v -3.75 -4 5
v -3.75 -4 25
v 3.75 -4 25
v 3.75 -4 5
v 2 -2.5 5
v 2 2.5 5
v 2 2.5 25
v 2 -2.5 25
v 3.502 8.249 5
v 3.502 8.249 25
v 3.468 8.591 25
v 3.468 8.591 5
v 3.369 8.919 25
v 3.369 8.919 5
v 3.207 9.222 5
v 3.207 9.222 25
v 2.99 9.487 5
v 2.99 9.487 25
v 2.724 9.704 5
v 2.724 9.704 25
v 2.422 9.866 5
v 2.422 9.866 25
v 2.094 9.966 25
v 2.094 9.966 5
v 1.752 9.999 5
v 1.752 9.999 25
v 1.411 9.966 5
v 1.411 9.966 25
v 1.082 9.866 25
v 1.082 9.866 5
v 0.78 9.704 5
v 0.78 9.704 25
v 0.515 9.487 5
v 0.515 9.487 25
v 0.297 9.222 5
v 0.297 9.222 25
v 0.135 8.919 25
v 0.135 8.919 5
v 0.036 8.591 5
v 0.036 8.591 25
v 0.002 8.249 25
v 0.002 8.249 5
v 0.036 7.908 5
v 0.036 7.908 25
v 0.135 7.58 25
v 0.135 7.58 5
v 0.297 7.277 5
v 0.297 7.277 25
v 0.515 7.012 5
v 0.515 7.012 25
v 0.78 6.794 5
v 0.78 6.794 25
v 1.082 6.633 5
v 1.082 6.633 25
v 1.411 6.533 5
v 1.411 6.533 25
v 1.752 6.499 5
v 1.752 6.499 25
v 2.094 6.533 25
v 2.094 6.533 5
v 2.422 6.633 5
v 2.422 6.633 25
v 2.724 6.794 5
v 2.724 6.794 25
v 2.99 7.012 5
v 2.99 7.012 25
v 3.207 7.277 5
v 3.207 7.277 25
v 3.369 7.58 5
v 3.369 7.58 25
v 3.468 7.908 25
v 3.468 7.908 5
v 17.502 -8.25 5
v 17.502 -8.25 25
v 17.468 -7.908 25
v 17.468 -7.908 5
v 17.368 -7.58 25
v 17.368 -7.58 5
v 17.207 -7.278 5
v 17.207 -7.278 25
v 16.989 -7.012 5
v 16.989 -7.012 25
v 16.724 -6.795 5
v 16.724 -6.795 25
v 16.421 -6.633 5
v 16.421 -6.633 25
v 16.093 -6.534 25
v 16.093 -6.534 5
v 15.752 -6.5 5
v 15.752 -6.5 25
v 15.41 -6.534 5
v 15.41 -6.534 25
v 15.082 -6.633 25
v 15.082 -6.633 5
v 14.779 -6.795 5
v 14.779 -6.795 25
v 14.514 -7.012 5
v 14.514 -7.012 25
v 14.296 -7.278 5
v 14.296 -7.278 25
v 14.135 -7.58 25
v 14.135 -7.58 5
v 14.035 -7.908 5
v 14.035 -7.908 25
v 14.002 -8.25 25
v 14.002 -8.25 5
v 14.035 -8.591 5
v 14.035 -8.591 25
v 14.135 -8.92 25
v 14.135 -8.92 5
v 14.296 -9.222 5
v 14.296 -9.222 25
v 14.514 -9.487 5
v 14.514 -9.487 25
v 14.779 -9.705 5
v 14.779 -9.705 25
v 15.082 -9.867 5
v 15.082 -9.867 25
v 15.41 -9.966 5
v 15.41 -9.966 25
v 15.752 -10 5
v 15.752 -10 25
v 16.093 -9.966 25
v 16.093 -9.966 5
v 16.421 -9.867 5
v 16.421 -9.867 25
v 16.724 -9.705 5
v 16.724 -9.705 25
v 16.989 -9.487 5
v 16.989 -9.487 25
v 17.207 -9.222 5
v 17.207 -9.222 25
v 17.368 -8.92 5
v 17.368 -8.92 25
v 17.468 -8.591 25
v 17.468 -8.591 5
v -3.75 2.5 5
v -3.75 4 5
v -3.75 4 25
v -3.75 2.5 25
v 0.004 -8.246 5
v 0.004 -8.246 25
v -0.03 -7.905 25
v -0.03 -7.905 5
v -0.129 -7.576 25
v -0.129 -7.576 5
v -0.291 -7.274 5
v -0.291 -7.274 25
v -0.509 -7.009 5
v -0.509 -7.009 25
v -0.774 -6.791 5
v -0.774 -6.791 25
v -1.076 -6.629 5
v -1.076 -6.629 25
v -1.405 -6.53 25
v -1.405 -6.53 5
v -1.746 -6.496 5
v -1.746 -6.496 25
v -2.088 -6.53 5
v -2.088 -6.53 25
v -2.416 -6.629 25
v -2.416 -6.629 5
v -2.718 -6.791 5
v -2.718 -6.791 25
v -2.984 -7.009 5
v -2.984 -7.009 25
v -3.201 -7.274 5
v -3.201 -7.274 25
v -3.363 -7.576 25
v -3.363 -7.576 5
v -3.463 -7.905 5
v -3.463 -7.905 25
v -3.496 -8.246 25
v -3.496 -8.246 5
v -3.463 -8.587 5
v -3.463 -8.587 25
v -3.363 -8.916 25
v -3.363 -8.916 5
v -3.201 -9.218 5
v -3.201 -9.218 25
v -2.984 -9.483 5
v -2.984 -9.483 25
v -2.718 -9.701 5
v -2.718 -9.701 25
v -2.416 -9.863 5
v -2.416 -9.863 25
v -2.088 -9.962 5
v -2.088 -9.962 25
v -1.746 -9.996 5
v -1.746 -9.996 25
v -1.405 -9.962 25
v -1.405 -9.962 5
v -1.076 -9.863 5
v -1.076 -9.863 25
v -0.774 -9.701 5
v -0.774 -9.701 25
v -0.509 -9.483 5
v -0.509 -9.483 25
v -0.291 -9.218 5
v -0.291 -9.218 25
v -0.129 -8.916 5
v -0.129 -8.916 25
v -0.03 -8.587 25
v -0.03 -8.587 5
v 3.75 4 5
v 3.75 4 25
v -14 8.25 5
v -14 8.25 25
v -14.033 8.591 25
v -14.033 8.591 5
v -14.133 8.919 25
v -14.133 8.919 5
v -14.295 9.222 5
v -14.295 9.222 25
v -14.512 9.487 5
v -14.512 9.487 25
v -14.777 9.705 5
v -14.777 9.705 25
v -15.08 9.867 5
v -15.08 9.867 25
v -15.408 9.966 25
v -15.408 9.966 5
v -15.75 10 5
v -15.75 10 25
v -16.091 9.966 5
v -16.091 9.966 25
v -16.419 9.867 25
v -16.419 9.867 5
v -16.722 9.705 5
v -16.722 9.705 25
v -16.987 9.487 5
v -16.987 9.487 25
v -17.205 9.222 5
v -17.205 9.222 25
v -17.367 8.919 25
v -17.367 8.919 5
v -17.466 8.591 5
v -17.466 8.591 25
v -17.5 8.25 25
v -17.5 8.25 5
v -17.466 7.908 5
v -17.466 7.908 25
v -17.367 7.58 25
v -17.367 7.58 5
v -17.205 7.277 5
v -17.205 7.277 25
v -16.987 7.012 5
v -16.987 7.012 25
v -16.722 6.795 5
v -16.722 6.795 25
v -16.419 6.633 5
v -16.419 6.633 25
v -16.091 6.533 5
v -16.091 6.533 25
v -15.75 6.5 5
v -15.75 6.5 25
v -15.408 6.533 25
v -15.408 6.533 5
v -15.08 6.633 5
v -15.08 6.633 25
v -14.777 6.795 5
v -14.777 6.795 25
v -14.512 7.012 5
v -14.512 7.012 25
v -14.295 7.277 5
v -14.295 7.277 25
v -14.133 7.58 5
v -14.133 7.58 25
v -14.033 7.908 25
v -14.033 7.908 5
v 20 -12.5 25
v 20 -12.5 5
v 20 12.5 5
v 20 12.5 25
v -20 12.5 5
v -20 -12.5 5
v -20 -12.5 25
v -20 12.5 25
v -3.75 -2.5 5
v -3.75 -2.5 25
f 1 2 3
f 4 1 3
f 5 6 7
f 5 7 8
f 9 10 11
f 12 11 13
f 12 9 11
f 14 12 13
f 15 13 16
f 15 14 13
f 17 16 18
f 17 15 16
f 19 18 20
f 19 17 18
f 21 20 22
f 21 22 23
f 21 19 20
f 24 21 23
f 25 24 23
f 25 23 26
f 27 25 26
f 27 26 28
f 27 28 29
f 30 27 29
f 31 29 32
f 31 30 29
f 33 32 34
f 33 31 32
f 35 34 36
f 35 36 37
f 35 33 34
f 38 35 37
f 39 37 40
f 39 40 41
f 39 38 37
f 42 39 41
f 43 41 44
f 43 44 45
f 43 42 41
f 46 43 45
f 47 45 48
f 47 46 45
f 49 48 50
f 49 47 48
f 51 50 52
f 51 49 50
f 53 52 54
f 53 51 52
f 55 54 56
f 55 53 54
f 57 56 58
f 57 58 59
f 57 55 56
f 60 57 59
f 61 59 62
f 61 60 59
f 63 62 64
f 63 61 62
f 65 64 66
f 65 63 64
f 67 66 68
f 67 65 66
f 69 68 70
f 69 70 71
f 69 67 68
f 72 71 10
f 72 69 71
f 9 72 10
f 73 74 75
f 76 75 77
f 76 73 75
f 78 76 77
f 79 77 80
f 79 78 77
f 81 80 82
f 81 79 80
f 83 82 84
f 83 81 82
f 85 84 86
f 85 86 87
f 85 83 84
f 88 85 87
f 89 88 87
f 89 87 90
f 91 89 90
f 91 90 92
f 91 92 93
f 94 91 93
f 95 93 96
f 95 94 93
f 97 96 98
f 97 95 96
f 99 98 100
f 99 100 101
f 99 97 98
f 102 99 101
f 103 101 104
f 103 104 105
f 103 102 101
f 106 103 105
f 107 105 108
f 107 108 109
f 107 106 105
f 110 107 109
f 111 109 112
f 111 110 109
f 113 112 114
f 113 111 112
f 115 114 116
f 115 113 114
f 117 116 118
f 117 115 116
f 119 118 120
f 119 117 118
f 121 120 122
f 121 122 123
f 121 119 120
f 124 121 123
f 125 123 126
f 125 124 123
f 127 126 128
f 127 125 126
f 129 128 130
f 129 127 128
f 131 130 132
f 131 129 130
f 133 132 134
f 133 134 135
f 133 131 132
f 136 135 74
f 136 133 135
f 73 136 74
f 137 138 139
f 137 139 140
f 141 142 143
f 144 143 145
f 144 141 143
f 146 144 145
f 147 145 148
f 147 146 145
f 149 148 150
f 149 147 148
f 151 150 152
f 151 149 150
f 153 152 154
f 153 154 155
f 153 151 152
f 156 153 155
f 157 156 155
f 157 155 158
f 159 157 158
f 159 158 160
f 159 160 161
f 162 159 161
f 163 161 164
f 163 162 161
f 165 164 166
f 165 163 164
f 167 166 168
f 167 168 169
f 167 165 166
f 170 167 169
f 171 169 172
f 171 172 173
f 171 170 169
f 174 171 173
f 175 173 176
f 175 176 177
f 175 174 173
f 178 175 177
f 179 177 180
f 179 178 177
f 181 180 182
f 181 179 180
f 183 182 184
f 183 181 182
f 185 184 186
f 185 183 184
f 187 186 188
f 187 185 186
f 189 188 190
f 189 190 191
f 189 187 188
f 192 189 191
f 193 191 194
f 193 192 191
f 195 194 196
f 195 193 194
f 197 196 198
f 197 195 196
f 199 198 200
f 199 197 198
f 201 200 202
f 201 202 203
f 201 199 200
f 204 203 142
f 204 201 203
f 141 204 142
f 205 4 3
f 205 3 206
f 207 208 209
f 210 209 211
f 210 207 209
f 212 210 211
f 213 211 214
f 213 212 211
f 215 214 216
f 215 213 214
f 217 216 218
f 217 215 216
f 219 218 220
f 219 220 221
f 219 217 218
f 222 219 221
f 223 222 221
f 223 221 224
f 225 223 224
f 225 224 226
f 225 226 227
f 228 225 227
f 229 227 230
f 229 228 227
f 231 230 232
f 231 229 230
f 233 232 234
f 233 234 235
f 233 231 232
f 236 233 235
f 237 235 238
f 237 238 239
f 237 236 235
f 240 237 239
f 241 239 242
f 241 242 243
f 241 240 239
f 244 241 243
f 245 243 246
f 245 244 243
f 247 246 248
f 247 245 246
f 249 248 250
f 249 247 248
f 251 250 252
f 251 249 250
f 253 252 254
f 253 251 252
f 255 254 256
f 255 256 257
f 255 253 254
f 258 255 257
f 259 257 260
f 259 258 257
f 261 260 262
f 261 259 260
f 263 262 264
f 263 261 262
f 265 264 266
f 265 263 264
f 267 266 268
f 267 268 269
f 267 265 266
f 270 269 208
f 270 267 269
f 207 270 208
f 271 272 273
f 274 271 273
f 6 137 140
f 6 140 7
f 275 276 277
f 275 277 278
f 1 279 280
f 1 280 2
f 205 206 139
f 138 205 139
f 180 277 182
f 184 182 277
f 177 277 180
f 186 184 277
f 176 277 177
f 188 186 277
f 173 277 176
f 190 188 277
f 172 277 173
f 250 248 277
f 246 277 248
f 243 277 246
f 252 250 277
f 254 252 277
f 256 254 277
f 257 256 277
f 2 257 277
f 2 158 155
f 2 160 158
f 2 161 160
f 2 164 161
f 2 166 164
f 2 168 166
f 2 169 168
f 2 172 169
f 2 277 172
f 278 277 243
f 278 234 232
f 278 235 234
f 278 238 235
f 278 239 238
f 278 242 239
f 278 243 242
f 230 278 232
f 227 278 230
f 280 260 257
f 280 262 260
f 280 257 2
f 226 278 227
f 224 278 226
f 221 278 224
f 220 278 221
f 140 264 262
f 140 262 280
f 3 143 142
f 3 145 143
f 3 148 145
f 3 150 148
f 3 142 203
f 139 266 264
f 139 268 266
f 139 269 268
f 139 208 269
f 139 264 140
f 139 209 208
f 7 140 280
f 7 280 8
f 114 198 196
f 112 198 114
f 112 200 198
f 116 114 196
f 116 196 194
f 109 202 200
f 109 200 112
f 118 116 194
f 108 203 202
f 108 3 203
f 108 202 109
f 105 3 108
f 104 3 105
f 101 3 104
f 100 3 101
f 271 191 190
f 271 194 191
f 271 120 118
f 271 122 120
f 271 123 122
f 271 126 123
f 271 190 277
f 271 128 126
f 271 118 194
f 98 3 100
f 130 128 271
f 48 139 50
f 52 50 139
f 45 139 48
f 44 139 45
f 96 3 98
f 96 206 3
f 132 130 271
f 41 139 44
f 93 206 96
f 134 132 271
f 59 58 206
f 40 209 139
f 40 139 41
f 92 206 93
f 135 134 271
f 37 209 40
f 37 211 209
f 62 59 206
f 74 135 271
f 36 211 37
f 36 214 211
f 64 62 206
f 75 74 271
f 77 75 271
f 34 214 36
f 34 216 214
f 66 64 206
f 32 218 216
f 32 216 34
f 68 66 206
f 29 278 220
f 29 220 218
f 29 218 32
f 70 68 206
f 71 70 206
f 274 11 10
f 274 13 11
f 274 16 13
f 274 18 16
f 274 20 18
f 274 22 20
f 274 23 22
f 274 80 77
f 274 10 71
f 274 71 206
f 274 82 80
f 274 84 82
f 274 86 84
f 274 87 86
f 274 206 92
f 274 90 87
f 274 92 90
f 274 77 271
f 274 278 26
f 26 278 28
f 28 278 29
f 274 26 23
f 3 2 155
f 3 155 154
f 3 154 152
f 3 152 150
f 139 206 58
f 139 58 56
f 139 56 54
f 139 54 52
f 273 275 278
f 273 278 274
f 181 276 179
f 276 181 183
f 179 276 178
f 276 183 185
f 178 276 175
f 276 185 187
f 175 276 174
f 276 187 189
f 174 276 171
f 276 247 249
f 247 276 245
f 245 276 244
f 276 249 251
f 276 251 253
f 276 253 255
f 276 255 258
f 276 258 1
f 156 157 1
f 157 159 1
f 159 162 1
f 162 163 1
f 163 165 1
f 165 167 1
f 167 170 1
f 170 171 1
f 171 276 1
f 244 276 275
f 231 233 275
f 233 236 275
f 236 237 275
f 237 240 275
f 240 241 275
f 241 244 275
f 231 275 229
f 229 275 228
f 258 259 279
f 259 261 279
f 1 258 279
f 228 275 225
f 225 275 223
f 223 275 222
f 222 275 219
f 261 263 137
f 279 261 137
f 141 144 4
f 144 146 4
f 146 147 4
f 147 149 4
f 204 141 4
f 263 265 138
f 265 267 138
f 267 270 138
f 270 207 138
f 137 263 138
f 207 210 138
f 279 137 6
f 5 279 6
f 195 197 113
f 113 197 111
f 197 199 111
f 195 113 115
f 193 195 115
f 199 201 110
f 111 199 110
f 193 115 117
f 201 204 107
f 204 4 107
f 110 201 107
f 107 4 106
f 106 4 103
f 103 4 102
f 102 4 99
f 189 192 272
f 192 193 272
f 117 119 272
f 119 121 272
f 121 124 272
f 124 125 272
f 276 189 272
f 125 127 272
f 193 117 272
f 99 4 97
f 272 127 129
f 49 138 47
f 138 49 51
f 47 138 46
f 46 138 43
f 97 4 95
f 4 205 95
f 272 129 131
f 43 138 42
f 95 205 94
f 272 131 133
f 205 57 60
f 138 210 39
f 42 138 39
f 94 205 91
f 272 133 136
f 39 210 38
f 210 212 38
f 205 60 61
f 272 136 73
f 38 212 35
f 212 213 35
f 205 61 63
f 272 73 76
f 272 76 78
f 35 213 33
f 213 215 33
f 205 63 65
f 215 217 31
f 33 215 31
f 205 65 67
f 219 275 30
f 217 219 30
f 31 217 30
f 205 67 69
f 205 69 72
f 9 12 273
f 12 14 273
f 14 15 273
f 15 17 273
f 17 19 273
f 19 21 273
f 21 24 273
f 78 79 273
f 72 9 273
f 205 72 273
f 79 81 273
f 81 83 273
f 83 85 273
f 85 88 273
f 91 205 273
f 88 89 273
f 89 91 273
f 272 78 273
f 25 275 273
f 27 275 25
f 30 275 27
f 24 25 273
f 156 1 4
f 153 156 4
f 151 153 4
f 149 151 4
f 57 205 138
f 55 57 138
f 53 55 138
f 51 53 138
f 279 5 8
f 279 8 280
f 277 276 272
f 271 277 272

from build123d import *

# Parameters (mm, degrees)
SKETCH001_W = 40
SKETCH001_H = 25
SKETCH001_R = 1.75
PAD_DEPTH   = 20


with BuildPart() as part:
    # Sketch001 → Pad (new body)
    with BuildSketch(Plane.XY.offset(5)):
        Rectangle(SKETCH001_W, SKETCH001_H)
        with Locations((-1.746173, -8.246033)):
            Circle(SKETCH001_R, mode=Mode.SUBTRACT)
        with Locations((1.752117, 8.249296)):
            Circle(SKETCH001_R, mode=Mode.SUBTRACT)
        with Locations((15.75151, -8.249899)):
            Circle(SKETCH001_R, mode=Mode.SUBTRACT)
        with Locations((-15.749744, 8.249736)):
            Circle(SKETCH001_R, mode=Mode.SUBTRACT)
        Polygon((3.75, -4), (3.75, 4), (-3.75, 4), (-3.75, 2.5), (2, 2.5), (2, -2.5), (-3.75, -2.5), (-3.75, -4), align=None, mode=Mode.SUBTRACT)
    extrude(amount=PAD_DEPTH)


solid = part.part
